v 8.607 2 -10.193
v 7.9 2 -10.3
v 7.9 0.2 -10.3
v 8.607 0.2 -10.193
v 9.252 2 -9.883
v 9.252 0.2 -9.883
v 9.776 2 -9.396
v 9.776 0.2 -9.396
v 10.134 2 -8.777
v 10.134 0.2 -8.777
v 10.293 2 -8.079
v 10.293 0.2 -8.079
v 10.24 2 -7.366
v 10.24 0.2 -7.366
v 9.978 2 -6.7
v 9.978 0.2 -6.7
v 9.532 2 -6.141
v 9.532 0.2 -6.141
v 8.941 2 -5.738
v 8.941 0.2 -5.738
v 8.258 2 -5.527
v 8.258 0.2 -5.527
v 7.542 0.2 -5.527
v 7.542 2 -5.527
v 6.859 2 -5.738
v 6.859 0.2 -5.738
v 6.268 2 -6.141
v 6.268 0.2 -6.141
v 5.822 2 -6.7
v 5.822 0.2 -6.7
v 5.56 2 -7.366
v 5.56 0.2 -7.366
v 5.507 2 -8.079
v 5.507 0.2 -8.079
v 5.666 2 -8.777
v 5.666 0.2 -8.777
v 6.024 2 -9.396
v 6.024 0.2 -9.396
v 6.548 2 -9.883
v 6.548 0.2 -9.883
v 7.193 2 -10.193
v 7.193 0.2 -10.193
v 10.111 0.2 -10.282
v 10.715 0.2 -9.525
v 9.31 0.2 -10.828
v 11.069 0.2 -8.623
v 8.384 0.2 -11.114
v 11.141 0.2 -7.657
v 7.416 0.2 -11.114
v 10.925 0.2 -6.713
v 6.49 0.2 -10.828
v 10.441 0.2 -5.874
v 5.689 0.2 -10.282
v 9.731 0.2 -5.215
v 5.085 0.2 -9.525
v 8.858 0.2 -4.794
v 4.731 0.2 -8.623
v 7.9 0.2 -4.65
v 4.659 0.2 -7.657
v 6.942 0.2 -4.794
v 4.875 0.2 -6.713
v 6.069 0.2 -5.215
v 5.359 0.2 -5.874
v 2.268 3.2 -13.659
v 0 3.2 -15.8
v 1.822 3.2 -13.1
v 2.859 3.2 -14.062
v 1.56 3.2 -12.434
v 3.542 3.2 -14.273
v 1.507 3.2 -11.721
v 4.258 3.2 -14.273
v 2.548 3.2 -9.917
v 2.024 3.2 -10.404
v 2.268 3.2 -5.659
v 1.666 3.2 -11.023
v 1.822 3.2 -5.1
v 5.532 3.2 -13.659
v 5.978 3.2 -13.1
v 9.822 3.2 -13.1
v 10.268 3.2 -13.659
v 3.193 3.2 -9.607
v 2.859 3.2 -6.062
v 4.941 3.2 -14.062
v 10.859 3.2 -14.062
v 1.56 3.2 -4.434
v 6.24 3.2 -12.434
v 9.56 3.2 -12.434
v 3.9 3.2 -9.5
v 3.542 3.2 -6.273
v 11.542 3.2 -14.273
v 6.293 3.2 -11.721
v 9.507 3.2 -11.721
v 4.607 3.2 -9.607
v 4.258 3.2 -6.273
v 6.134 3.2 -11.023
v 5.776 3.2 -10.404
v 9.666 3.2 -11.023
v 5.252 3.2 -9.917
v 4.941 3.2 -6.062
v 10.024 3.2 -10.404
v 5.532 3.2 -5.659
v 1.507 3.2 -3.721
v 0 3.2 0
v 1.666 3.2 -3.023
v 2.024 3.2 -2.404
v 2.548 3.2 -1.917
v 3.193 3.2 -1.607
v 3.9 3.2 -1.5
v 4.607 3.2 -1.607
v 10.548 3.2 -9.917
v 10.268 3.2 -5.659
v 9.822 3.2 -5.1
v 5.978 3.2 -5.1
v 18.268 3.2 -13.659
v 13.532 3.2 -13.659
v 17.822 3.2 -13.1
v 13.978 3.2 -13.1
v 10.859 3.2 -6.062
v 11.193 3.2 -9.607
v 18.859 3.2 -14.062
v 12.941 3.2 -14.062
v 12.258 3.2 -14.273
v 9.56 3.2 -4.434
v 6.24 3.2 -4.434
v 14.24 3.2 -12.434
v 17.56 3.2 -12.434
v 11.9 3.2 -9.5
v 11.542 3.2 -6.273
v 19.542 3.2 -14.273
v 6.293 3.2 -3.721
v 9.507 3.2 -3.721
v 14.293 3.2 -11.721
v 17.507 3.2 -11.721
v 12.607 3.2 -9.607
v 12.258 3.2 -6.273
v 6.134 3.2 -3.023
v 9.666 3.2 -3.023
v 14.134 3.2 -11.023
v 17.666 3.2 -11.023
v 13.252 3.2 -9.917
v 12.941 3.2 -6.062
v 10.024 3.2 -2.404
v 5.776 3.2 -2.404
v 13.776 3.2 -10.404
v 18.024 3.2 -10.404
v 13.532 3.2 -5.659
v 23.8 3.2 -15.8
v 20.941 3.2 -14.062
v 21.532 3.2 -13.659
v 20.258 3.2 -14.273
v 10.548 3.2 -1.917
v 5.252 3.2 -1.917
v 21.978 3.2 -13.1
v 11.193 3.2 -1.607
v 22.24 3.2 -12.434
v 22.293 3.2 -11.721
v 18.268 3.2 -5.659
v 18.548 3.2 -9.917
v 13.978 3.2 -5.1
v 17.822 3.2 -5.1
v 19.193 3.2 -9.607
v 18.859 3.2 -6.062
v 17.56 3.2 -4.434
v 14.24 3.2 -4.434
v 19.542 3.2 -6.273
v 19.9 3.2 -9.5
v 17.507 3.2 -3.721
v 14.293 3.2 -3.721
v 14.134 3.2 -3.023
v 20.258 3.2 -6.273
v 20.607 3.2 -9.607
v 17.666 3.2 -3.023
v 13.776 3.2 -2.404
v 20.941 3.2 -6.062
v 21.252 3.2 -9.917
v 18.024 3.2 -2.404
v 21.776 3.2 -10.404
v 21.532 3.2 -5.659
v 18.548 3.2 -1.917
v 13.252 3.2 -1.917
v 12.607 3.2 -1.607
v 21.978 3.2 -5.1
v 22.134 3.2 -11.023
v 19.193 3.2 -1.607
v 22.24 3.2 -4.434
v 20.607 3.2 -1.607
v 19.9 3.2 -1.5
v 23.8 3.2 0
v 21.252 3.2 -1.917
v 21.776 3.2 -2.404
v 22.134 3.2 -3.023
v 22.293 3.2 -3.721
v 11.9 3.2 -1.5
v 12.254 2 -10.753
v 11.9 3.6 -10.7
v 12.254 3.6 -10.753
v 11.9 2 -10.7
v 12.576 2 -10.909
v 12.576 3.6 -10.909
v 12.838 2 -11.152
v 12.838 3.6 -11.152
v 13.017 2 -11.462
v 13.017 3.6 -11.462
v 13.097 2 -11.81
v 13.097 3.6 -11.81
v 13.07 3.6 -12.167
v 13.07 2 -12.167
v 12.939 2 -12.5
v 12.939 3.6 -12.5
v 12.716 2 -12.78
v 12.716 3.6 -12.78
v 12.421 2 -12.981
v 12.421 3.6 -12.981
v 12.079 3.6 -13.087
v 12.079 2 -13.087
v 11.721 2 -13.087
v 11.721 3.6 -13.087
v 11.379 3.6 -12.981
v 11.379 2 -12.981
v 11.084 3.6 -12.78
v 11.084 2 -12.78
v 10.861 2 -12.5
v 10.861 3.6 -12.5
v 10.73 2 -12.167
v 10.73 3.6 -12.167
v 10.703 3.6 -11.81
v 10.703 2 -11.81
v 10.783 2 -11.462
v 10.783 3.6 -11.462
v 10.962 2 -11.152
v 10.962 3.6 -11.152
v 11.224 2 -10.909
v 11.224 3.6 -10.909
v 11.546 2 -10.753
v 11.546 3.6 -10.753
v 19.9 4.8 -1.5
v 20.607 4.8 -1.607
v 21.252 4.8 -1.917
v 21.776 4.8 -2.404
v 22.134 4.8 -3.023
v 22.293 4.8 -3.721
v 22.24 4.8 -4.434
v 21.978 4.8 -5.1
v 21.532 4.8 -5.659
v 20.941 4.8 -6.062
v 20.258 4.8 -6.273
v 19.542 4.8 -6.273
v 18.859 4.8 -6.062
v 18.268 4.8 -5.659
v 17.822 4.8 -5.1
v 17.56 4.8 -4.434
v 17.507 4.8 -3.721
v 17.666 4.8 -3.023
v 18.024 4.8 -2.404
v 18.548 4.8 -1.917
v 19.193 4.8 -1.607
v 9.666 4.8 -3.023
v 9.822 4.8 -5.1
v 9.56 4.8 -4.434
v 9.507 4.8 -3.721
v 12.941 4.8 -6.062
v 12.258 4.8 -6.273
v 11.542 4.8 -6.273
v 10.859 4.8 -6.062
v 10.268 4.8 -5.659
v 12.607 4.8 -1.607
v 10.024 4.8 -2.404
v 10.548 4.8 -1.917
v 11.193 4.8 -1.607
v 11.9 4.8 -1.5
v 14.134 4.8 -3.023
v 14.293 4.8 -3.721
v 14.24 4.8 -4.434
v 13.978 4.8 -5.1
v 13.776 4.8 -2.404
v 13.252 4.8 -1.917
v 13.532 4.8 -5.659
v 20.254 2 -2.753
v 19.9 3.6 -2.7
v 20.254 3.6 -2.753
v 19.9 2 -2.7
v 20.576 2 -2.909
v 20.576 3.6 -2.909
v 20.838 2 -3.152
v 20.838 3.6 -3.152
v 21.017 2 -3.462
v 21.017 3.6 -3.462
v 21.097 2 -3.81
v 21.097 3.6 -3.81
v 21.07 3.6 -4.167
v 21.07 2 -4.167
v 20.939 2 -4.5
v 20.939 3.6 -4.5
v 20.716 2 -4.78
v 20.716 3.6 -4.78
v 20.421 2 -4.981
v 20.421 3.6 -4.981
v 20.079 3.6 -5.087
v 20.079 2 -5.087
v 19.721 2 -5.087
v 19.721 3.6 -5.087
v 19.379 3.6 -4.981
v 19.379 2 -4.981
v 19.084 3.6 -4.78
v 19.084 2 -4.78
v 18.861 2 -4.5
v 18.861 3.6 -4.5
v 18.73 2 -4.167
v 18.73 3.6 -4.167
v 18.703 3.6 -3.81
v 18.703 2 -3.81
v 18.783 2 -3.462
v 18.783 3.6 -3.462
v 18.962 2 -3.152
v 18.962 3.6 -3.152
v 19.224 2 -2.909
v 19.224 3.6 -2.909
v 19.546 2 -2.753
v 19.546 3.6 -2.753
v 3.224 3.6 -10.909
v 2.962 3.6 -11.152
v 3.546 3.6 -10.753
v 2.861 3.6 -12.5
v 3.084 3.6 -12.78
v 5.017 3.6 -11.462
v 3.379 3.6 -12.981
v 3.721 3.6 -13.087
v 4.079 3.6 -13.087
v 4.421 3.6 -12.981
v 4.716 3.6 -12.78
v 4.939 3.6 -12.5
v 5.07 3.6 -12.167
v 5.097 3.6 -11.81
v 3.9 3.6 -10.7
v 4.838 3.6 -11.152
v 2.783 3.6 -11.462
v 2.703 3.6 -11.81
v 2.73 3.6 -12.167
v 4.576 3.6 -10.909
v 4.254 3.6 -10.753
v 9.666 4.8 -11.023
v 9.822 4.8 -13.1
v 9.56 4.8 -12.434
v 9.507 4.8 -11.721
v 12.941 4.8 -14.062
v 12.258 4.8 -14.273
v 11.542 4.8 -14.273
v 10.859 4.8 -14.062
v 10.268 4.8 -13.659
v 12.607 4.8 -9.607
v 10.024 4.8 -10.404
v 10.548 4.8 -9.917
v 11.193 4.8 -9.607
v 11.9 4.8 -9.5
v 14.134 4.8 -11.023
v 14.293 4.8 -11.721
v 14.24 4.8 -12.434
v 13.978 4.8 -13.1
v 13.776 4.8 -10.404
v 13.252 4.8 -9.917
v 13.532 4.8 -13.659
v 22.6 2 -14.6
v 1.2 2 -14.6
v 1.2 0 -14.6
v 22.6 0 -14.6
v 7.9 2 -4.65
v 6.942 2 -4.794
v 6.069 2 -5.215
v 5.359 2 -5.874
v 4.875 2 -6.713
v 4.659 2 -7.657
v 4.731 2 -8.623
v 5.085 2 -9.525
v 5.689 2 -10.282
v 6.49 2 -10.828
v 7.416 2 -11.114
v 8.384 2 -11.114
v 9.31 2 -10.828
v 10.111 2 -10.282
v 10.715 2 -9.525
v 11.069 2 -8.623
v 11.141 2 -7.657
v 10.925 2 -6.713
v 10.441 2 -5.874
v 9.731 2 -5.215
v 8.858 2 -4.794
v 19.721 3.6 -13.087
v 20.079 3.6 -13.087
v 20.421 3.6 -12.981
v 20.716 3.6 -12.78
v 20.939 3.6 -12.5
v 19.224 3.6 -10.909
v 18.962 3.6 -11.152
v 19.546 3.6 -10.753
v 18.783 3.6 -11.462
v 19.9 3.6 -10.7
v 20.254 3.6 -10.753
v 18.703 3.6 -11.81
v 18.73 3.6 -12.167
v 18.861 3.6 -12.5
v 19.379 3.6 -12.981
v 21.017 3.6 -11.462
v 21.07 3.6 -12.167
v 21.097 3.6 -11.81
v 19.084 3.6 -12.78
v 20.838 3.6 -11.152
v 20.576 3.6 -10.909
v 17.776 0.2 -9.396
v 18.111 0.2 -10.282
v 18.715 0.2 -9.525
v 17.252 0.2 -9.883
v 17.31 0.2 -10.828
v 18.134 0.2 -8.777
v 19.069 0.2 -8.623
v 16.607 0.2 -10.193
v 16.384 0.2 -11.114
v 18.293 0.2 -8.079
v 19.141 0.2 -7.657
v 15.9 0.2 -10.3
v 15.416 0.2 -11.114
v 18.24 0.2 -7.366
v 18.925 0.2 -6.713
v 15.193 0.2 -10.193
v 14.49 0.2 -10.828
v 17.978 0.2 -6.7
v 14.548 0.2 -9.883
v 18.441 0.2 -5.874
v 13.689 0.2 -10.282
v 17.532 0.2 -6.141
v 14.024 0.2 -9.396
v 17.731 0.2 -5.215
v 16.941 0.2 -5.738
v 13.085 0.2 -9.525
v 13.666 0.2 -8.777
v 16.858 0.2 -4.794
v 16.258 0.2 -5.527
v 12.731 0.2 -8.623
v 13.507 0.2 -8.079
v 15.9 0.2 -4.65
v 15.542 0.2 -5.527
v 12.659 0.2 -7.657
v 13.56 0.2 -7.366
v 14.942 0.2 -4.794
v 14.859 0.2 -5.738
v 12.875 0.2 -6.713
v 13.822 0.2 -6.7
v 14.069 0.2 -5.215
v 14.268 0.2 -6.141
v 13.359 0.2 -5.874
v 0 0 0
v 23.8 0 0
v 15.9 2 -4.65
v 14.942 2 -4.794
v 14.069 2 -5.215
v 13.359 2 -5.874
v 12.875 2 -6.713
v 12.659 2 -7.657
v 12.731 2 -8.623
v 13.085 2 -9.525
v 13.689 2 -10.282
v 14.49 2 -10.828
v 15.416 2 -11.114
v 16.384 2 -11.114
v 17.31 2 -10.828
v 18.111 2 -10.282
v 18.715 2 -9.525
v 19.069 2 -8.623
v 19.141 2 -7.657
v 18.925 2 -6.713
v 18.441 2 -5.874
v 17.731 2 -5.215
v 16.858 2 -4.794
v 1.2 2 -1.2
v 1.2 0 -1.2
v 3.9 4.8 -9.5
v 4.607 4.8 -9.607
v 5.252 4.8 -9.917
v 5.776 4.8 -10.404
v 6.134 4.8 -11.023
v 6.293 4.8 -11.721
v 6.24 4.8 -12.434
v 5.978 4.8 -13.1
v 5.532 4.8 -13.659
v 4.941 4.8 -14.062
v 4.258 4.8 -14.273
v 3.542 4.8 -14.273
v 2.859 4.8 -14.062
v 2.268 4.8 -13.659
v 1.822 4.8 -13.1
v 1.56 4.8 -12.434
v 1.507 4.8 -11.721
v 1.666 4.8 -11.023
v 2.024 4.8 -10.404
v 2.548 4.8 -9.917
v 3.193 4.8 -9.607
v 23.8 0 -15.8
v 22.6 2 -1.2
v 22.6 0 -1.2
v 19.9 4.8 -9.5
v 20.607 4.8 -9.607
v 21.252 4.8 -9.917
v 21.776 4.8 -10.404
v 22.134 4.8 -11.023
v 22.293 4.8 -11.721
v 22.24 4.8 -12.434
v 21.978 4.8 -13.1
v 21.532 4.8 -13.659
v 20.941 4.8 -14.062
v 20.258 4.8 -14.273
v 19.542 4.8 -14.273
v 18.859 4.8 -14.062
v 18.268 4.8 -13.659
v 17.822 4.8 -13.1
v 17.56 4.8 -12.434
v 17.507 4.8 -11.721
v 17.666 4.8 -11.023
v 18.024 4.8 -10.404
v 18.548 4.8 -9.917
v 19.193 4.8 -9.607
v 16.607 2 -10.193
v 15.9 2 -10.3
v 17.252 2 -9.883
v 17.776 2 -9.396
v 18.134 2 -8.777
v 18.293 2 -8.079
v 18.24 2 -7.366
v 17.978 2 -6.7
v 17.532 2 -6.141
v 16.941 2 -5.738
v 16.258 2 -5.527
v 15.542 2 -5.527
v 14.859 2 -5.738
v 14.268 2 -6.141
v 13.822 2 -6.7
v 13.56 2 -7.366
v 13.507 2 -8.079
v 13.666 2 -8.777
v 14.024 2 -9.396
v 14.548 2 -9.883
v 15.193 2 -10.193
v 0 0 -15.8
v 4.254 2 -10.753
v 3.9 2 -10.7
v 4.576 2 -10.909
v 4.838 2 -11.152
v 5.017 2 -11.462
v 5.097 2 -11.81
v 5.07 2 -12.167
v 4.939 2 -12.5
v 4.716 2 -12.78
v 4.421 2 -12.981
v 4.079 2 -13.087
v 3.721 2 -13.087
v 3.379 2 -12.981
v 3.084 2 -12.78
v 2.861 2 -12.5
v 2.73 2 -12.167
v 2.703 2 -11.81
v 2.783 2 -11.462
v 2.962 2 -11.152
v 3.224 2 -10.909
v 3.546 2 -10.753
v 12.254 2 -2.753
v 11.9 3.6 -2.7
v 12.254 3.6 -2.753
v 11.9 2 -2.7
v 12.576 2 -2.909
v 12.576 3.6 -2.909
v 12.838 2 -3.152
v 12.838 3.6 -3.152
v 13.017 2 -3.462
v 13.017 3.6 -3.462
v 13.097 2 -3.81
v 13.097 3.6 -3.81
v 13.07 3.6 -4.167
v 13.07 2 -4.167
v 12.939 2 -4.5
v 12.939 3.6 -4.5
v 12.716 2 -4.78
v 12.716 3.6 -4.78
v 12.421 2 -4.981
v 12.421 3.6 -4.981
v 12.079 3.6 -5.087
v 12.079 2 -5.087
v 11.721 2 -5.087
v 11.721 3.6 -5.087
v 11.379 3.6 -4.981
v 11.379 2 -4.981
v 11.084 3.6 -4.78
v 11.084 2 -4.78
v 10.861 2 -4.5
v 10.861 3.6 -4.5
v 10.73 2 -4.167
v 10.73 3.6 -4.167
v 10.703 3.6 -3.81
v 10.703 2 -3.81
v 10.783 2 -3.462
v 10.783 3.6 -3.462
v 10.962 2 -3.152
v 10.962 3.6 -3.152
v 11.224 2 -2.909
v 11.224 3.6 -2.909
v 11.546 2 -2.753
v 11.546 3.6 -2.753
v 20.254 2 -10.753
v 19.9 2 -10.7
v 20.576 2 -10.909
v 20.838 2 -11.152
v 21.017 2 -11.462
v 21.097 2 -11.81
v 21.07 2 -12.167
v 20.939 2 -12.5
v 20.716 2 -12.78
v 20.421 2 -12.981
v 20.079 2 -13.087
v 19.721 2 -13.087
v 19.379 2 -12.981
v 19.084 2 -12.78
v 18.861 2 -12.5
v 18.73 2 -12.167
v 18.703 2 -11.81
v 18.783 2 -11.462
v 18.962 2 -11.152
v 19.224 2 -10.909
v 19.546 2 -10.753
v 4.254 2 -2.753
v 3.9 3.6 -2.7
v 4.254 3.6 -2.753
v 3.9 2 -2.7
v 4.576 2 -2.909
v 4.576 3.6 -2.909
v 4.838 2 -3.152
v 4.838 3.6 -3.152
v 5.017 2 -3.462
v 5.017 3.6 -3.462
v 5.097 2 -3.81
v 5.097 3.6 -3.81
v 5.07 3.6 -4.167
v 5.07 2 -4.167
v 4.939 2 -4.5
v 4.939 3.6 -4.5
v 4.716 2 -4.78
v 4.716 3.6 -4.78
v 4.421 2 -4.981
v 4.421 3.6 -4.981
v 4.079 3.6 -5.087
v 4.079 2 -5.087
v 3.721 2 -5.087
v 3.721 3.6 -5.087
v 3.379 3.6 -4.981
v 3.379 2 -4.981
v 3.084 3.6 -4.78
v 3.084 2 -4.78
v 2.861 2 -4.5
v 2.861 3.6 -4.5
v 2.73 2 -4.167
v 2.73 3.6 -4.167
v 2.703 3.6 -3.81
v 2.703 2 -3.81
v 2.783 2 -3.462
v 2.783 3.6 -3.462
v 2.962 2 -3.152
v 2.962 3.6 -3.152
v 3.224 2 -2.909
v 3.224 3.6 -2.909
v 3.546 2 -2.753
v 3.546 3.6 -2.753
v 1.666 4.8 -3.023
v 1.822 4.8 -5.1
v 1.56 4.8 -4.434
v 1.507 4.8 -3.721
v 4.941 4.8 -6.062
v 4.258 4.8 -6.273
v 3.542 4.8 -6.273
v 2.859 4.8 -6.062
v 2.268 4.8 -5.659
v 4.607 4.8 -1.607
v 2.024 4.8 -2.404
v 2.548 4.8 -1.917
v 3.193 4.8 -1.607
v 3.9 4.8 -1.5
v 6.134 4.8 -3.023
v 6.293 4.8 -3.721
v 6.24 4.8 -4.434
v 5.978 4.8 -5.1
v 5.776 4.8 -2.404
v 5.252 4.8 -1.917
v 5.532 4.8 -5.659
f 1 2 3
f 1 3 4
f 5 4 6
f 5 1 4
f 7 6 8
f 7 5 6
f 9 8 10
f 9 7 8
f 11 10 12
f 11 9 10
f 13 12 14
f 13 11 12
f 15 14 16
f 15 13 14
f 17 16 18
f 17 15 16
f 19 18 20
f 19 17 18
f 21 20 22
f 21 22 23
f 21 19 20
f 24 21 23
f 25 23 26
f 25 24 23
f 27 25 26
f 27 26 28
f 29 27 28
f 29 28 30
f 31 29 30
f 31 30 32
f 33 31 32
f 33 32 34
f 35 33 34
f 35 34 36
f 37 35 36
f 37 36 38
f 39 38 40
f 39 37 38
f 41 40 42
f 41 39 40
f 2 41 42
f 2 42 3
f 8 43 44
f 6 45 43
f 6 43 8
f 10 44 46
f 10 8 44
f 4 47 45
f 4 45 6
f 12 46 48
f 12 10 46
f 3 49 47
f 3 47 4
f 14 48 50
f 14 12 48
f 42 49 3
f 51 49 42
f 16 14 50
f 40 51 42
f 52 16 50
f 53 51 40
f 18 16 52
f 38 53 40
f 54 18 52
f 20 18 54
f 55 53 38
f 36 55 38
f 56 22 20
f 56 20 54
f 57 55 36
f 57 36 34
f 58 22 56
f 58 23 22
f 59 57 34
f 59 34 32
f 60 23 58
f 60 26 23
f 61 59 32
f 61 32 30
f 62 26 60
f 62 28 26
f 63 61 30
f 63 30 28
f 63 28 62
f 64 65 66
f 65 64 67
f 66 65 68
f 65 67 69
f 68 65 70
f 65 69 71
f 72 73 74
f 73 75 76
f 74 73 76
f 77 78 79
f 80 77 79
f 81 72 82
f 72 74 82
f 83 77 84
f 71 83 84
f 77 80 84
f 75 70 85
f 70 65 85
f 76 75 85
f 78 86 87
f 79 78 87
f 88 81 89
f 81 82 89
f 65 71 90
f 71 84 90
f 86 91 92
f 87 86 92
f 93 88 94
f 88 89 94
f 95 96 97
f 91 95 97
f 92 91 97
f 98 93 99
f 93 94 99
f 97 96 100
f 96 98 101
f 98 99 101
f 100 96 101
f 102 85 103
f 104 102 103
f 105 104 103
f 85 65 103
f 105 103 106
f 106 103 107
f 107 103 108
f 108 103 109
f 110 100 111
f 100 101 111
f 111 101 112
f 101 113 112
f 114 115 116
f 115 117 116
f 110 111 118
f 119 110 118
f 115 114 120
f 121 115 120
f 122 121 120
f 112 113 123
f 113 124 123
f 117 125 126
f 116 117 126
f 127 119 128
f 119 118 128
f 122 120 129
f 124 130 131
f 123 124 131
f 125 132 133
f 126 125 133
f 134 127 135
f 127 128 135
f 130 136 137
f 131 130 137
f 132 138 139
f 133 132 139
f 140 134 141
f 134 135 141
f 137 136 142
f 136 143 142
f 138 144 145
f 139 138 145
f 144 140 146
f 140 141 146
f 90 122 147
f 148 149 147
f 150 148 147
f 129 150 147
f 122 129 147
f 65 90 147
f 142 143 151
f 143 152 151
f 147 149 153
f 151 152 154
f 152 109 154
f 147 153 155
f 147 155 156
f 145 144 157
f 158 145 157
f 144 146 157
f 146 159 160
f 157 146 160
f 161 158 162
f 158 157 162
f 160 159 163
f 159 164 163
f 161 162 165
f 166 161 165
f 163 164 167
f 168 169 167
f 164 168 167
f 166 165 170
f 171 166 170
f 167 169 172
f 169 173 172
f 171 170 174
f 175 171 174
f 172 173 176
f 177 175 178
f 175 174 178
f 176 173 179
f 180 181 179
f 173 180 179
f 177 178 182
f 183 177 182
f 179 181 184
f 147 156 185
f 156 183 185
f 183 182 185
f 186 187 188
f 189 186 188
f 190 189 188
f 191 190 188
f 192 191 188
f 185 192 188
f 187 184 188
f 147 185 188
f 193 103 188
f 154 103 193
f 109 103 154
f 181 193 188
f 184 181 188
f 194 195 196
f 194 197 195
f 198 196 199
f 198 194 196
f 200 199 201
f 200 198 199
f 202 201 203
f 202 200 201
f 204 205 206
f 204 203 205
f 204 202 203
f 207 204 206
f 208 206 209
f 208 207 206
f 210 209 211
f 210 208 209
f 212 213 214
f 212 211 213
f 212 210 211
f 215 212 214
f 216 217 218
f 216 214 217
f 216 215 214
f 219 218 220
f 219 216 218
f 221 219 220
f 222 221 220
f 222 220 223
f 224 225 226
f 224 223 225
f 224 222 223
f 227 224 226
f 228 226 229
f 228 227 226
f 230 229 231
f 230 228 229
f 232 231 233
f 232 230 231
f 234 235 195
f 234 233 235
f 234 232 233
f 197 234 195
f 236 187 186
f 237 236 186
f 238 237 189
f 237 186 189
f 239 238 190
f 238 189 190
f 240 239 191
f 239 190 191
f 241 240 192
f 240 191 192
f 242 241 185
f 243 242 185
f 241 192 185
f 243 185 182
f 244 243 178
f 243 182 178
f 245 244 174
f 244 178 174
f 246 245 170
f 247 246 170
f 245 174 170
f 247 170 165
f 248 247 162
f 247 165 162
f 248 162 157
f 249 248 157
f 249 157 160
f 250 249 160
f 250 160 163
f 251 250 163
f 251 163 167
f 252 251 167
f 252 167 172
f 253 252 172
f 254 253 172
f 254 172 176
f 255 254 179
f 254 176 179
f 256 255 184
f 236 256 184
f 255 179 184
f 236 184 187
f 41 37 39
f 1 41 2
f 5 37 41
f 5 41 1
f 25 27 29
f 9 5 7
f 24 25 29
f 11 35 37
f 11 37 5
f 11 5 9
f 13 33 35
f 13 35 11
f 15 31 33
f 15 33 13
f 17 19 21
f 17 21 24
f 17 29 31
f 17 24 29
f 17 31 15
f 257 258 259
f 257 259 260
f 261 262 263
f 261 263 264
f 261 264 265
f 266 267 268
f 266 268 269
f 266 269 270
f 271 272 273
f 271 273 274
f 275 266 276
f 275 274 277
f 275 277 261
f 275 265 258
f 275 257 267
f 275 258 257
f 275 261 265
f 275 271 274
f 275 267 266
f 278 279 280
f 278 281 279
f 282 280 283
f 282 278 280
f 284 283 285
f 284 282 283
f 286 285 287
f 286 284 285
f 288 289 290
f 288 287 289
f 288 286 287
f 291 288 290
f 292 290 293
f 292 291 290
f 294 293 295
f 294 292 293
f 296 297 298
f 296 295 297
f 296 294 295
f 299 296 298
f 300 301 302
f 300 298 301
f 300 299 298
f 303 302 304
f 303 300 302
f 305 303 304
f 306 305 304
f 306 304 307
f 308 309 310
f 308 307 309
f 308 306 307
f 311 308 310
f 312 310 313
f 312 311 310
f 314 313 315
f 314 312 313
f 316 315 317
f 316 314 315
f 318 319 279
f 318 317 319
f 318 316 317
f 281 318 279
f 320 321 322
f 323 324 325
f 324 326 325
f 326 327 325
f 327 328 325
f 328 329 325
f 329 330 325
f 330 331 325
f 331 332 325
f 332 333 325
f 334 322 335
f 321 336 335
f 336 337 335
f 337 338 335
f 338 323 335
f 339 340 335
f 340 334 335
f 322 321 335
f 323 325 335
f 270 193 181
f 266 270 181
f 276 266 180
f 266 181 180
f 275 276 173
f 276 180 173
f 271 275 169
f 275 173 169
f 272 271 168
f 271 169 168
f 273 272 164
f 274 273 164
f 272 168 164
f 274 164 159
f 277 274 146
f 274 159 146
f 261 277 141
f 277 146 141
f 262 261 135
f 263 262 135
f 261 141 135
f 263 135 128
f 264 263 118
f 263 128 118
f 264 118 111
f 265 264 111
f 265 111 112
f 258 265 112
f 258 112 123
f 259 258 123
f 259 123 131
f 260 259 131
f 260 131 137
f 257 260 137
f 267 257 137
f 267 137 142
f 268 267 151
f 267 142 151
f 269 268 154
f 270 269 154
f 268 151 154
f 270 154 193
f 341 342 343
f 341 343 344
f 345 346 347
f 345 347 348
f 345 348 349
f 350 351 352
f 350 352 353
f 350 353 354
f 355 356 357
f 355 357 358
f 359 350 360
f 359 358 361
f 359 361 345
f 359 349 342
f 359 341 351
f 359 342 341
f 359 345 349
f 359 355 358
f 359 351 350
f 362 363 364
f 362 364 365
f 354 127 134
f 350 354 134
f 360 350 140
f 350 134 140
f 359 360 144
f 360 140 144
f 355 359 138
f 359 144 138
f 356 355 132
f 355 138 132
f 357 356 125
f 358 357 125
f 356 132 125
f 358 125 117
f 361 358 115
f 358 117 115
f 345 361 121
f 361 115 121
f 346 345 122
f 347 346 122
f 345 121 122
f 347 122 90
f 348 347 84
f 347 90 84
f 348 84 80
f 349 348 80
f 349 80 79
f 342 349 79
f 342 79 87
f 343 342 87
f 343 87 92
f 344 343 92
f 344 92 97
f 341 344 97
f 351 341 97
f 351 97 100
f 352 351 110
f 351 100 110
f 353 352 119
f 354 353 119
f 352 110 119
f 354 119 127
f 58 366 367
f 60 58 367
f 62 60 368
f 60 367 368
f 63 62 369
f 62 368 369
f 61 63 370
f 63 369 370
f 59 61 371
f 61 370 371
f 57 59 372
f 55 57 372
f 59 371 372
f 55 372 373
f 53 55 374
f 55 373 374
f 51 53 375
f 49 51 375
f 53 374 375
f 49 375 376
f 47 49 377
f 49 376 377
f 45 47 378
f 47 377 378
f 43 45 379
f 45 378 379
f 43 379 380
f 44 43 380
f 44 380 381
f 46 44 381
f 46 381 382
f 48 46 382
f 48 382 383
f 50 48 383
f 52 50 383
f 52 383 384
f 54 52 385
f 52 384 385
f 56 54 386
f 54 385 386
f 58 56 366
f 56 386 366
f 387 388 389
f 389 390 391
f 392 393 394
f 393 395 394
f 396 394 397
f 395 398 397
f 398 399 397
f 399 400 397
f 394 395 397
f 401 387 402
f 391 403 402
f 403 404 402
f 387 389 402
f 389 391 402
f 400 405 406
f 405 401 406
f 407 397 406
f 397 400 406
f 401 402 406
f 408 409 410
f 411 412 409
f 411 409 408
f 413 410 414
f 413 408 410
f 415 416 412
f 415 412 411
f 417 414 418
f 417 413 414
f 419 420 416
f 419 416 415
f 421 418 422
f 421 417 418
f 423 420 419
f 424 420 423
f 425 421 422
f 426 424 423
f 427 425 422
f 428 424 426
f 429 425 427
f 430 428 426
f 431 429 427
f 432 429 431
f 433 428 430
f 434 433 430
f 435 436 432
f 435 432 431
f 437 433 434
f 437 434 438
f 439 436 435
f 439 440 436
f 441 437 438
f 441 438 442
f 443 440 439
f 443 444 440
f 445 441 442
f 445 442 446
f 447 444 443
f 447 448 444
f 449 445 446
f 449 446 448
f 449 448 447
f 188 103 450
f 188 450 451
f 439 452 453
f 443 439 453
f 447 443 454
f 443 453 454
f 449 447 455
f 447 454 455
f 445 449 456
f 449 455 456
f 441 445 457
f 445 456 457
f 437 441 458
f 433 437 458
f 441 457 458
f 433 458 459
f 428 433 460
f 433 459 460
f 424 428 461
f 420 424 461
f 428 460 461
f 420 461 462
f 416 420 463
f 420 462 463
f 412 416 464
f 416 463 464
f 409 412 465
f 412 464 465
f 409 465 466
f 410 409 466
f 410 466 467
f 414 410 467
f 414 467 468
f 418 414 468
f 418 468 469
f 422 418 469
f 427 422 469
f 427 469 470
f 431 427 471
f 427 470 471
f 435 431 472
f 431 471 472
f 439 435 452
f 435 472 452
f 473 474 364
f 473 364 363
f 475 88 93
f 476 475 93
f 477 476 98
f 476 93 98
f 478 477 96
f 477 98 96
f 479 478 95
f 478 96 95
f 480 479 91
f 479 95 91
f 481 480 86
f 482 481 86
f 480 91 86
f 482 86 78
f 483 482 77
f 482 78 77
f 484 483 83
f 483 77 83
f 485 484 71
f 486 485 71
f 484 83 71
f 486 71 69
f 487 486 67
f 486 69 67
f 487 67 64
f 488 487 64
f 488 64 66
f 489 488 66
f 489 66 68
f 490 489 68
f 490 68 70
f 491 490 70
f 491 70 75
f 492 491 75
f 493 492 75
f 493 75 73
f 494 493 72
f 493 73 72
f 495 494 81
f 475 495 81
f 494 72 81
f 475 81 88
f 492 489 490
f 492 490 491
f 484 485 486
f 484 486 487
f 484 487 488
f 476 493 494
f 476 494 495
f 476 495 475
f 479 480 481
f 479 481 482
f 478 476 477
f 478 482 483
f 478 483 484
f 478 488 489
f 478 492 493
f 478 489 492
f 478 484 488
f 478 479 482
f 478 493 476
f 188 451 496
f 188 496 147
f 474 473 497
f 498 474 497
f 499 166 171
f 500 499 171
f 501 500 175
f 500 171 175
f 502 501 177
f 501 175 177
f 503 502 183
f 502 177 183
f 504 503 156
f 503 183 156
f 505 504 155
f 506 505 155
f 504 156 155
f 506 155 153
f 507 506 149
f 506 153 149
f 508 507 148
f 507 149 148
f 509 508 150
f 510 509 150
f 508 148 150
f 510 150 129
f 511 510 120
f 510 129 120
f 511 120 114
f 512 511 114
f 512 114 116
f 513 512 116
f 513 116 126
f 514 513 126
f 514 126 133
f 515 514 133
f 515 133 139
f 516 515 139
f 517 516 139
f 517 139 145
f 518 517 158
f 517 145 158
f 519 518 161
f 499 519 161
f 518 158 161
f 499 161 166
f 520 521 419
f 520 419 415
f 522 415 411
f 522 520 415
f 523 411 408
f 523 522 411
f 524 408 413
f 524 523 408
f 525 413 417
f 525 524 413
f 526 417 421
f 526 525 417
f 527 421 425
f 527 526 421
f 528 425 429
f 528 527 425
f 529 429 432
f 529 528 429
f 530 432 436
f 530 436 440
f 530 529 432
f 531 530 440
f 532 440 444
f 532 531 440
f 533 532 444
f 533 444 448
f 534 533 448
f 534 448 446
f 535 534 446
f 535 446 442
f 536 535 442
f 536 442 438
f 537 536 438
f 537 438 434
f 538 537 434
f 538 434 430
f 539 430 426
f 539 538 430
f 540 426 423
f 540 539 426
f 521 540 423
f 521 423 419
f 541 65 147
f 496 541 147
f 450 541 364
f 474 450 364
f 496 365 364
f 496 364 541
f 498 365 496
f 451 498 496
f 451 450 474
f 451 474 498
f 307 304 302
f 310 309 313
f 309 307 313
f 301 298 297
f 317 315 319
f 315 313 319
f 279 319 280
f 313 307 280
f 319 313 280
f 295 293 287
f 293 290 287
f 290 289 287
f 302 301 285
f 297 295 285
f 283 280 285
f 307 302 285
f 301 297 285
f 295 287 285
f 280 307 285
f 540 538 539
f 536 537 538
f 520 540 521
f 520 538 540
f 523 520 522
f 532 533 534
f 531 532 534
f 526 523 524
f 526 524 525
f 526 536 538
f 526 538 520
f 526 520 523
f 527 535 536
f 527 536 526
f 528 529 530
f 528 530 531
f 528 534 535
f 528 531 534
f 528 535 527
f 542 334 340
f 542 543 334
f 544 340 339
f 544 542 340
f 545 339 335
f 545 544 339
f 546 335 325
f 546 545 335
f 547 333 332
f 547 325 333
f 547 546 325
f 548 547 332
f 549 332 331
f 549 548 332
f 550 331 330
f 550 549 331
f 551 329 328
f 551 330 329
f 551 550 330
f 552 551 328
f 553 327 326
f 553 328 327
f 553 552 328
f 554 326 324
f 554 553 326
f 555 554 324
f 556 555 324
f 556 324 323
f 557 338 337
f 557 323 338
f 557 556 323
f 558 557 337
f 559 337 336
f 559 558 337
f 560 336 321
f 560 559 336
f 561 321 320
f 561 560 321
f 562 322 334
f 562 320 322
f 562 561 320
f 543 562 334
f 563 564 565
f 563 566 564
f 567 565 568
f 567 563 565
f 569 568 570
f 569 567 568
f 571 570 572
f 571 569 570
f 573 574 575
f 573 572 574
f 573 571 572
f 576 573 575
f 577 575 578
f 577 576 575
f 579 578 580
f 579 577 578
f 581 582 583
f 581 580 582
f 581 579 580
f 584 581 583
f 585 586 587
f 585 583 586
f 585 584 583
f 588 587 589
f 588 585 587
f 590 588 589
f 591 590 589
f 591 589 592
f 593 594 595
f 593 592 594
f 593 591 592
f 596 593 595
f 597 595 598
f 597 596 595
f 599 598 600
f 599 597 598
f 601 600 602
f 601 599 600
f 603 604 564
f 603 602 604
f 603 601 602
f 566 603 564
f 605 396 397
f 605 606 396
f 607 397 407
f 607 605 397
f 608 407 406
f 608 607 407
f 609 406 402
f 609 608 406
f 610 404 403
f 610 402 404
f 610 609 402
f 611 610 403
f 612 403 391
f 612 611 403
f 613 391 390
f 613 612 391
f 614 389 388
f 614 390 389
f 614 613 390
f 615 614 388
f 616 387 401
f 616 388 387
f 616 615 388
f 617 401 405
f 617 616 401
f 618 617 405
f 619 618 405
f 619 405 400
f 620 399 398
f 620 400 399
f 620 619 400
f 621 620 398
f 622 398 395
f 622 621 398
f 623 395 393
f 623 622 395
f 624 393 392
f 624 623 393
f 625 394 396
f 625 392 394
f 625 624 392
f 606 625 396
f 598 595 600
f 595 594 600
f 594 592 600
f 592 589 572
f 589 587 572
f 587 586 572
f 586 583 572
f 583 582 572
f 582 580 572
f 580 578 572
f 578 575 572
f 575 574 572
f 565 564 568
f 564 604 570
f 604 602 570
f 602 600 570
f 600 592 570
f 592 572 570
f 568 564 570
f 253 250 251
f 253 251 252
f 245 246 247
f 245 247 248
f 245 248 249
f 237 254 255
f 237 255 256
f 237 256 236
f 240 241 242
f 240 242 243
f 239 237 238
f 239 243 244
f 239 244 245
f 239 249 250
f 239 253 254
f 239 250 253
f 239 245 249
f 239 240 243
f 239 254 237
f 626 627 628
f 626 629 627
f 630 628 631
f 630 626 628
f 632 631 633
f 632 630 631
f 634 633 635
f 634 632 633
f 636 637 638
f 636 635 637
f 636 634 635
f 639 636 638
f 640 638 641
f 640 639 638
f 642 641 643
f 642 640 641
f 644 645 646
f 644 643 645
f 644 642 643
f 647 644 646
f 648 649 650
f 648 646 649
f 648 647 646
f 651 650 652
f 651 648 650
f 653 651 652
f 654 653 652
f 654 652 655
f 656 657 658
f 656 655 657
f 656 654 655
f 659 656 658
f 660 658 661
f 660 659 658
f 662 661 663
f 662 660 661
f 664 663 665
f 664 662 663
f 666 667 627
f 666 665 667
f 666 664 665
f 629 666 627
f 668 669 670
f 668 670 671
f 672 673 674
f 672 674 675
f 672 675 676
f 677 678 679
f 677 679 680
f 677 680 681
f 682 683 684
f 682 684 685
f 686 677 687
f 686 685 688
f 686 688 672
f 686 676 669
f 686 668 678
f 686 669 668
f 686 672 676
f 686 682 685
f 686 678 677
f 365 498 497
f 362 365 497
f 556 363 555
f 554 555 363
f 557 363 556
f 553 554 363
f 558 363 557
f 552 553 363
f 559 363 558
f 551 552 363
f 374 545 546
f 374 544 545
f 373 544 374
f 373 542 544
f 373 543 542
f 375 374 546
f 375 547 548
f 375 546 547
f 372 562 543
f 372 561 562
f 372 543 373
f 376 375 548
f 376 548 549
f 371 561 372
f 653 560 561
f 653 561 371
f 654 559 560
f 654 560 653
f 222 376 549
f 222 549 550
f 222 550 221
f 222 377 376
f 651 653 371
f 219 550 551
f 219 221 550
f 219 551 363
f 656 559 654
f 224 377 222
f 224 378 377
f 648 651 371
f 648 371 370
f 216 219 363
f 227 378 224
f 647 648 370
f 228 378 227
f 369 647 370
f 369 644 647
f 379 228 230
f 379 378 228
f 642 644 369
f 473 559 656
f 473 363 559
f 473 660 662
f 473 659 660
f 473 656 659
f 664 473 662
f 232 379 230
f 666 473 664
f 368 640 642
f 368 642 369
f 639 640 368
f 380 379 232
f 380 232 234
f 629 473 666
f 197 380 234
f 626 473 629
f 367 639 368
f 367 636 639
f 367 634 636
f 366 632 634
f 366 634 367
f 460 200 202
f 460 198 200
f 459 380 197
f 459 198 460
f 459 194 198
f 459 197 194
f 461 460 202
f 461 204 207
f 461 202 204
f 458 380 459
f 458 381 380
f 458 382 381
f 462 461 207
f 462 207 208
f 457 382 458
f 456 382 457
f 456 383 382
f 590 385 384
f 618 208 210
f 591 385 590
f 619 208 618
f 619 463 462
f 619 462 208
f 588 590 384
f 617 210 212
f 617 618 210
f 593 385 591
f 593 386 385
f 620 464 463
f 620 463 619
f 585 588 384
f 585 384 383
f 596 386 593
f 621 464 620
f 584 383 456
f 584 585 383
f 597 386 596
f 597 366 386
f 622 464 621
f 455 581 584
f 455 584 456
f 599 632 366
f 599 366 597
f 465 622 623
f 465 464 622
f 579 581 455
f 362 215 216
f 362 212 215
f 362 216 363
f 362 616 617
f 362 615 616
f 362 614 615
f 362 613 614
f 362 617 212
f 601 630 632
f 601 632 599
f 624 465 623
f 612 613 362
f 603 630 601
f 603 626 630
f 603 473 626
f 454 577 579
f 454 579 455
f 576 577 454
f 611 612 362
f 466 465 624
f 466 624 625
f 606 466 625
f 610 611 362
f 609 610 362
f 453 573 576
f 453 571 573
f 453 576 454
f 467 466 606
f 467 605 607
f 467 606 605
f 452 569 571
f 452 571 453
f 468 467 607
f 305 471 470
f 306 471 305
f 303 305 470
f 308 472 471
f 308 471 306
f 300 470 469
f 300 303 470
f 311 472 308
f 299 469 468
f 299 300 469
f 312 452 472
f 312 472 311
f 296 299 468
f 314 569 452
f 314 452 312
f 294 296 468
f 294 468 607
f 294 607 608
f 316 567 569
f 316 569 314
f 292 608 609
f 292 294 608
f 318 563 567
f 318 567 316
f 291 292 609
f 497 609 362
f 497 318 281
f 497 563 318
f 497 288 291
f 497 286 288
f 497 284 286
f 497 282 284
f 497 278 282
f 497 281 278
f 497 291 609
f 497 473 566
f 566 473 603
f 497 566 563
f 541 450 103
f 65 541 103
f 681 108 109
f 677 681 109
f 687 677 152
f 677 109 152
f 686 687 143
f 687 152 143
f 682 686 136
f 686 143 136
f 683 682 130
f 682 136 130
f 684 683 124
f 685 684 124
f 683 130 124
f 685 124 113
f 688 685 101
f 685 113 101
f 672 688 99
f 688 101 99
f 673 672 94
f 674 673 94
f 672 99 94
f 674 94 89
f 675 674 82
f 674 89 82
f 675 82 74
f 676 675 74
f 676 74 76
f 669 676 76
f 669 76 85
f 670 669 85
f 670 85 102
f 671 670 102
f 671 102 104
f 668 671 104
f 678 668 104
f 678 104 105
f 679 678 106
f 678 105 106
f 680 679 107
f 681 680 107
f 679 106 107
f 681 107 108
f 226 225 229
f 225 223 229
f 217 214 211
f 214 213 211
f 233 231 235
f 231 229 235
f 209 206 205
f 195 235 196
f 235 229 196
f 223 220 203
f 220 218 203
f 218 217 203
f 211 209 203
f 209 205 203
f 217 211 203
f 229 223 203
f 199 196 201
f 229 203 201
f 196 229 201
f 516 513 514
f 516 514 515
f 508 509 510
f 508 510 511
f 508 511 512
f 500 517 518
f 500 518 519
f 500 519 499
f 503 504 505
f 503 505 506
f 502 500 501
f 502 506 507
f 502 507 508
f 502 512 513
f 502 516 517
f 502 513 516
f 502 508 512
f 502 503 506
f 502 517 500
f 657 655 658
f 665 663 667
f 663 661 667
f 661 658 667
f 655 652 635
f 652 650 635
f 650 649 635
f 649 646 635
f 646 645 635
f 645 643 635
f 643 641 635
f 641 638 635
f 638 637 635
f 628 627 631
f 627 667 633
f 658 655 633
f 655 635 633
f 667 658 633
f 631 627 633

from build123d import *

# Parameters (mm, degrees)
SKETCH1_W            = 23.8
SKETCH1_H            = 3.2
BOSS_EXTRUDE1_DEPTH  = 15.8
SKETCH2_R            = 2.4
BOSS_EXTRUDE2_DEPTH  = 1.6
LPATTERN1_COUNT      = 2
LPATTERN1_PITCH      = 8
LPATTERN1_COUNT_DIR2 = 6
LPATTERN1_PITCH_DIR2 = 8
SHELL1_T             = -1.2
SKETCH3_R            = 3.25
SKETCH3_R_2          = 2.4
BOSS_EXTRUDE3_DEPTH  = 1.8
LPATTERN2_COUNT      = 2
LPATTERN2_PITCH      = 8


with BuildPart() as part:
    # Sketch1 → Boss-Extrude1 (new body)
    with BuildSketch(Plane.XY):
        with Locations((11.9, 1.6)):
            Rectangle(SKETCH1_W, SKETCH1_H)
    extrude(amount=-BOSS_EXTRUDE1_DEPTH)

    # Sketch2 → Boss-Extrude2 (add)
    with BuildSketch(Plane(origin=(0, 3.2, 0), x_dir=(1, 0, 0), z_dir=(0, 1, 0))):
        with Locations(Location((3.9, 3.9, 0), (0, 0, 270))):
            Circle(SKETCH2_R)
    boss_extrude2 = extrude(amount=BOSS_EXTRUDE2_DEPTH)

    # LPattern1: Boss-Extrude2 2 × 6, 6 skipped
    with Locations(*[(j * LPATTERN1_PITCH_DIR2, 0, -i * LPATTERN1_PITCH) for i in range(LPATTERN1_COUNT) for j in range(LPATTERN1_COUNT_DIR2) if (i, j) not in ((0, 0), (0, 3), (0, 4), (0, 5), (1, 3), (1, 4), (1, 5))]):
        add(boss_extrude2)

    # Shell1
    shell1_openings = [part.faces().sort_by_distance(p)[0] for p in [
        (11.9, 0, -7.9),
    ]]
    offset(amount=SHELL1_T, openings=shell1_openings, kind=Kind.INTERSECTION)

    # Sketch3 → Boss-Extrude3 (add)
    with BuildSketch(Plane.XZ.offset(-2)):
        with Locations(Location((7.9, -7.9, 0), (0, 0, 90))):
            Circle(SKETCH3_R)
        with Locations(Location((7.9, -7.9, 0), (0, 0, 270))):
            Circle(SKETCH3_R_2, mode=Mode.SUBTRACT)
    boss_extrude3 = extrude(amount=BOSS_EXTRUDE3_DEPTH)

    # LPattern2: Boss-Extrude3 ×2
    with Locations(*[(i * LPATTERN2_PITCH, 0, 0) for i in range(1, LPATTERN2_COUNT)]):
        add(boss_extrude3)


solid = part.part
